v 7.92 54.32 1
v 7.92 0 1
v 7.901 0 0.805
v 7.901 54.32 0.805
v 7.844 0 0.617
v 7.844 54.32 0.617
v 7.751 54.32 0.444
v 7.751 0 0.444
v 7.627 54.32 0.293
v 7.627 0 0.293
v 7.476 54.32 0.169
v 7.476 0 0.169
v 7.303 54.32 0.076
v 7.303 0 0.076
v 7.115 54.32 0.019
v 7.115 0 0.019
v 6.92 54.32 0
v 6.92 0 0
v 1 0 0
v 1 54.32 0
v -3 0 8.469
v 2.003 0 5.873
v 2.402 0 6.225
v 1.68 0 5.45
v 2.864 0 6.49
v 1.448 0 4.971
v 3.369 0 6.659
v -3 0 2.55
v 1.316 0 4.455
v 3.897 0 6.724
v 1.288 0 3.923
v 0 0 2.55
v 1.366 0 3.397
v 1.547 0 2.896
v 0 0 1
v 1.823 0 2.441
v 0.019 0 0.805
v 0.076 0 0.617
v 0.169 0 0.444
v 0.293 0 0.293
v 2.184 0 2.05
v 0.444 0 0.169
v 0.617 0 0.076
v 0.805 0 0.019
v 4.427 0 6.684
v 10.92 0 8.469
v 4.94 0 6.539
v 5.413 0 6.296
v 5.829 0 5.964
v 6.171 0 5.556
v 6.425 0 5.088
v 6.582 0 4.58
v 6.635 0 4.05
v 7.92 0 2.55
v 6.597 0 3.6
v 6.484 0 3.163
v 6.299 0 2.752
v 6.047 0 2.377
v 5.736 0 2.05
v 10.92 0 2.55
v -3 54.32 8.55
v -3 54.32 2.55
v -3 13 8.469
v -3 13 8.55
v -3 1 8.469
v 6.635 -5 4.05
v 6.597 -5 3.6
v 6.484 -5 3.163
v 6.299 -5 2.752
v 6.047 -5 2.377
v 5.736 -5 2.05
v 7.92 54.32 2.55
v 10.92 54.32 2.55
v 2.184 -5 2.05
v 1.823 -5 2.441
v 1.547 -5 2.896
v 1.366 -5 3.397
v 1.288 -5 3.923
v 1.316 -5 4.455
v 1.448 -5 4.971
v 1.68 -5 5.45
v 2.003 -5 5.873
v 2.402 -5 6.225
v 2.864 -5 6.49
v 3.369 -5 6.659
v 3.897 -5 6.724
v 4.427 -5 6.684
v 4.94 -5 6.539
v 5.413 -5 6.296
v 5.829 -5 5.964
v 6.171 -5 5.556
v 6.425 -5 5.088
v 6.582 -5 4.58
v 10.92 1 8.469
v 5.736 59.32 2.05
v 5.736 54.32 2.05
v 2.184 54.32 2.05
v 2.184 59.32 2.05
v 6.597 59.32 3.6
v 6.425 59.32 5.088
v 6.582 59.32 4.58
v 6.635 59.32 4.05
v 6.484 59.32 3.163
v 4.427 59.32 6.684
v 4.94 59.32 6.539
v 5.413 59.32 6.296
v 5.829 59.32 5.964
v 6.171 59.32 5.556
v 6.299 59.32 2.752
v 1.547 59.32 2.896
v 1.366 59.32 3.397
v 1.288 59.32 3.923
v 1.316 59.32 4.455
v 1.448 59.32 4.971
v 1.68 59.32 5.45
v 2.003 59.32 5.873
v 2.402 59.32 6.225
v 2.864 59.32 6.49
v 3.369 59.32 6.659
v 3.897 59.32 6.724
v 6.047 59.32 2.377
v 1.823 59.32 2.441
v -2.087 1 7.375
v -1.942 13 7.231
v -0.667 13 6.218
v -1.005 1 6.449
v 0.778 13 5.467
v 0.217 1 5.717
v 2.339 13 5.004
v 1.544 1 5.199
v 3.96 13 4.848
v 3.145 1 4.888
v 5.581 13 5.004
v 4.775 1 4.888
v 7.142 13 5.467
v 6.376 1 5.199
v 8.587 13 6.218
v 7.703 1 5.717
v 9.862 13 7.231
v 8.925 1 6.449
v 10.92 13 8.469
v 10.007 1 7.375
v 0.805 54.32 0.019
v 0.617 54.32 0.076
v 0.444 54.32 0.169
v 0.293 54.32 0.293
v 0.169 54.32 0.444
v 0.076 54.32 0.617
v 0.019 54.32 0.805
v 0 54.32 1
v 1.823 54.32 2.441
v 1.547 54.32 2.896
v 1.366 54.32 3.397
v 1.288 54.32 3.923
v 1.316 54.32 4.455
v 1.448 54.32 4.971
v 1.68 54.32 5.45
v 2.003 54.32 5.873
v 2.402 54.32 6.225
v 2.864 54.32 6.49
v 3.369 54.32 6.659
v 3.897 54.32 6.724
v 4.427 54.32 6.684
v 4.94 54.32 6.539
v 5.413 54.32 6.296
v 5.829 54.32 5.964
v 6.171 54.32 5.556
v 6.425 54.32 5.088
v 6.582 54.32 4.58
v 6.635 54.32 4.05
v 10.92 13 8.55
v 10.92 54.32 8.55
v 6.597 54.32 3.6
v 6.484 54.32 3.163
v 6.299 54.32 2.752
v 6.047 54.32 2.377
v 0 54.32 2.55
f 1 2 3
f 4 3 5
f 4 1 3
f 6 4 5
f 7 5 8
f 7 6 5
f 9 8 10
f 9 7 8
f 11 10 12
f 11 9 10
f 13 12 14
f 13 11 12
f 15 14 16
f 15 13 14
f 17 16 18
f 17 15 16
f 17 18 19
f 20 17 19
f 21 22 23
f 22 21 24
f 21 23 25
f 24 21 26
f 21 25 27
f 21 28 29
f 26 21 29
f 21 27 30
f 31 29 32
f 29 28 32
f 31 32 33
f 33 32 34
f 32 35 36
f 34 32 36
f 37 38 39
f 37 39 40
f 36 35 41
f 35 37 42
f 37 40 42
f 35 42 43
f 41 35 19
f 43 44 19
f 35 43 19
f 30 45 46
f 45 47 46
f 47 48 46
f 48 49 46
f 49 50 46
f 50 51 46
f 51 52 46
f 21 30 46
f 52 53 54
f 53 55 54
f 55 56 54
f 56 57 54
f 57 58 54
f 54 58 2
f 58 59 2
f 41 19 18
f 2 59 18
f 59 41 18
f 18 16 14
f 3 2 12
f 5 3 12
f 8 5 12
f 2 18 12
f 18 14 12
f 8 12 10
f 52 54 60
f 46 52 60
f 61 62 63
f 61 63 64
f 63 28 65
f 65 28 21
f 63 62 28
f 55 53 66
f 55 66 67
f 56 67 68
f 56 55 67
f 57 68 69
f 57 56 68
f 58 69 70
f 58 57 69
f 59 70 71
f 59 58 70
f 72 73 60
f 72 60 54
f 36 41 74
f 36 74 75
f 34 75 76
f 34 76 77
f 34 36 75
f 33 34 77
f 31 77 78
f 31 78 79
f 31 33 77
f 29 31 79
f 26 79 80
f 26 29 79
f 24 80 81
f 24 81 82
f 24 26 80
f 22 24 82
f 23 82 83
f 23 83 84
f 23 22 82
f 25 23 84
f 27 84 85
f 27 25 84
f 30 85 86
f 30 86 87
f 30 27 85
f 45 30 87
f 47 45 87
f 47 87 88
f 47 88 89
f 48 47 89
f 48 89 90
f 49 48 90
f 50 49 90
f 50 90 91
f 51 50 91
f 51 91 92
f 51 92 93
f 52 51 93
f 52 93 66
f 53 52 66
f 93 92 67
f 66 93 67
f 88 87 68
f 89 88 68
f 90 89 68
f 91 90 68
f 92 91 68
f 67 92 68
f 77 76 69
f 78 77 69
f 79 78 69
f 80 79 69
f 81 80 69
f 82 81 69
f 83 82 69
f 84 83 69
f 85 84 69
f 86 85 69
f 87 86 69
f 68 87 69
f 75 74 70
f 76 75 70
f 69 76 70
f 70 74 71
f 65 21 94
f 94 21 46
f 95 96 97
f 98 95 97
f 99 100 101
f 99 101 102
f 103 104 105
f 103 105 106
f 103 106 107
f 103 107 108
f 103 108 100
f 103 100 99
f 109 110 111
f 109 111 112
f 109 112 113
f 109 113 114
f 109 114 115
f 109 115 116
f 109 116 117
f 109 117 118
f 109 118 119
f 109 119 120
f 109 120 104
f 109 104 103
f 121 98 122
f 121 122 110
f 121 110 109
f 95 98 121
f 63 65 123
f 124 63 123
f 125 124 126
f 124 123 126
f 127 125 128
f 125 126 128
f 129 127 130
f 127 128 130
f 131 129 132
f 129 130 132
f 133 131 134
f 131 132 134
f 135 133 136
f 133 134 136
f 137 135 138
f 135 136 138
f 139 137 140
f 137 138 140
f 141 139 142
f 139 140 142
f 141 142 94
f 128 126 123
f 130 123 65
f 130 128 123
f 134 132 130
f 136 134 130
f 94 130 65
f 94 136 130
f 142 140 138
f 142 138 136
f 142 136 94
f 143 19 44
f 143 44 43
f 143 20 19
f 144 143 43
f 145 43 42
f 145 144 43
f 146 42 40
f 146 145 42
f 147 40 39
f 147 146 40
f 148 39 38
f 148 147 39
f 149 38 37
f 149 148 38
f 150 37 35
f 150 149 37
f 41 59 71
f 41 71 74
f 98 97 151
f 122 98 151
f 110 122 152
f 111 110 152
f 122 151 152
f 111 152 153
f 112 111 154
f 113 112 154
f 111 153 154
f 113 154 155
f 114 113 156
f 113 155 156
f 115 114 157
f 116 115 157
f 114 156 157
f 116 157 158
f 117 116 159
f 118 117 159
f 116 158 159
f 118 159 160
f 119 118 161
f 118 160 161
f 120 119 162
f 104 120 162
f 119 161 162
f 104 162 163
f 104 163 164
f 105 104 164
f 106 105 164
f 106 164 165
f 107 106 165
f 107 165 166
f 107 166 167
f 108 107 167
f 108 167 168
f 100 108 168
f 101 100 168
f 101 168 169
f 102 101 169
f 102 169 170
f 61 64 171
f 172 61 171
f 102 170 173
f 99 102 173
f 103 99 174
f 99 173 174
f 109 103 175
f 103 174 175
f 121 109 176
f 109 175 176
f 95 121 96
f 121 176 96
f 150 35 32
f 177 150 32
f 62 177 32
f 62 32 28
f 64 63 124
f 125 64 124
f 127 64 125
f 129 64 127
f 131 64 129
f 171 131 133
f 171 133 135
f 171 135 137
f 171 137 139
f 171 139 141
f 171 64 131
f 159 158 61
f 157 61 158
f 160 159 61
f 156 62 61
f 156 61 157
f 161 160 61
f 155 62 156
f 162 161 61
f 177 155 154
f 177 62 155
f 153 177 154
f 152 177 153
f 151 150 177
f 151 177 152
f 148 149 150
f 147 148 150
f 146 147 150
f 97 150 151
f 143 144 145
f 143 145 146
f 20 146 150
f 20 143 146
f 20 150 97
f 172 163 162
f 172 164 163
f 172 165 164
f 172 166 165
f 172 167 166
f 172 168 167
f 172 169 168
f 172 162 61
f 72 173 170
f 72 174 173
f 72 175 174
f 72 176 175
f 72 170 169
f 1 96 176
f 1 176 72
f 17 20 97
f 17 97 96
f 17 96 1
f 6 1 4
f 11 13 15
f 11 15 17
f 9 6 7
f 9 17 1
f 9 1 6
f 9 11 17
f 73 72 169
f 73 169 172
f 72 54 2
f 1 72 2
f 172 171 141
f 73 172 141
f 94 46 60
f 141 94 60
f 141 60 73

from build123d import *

# Parameters (mm, degrees)
BOSS_EXTRUDE1_DEPTH = 54.32
FILLET1_R           = 1
BOSS_EXTRUDE2_DEPTH = 5
SKETCH3_R           = 8.5
CUT_EXTRUDE1_DEPTH  = 13
BOSS_EXTRUDE3_DEPTH = 1


with BuildPart() as part:
    # Sketch1 → Boss-Extrude1 (new body)
    with BuildSketch(Plane(origin=(0, 0, 0), x_dir=(1, 0, 0), z_dir=(0, 1, 0))):
        Polygon((10.92, -2.55), (7.92, -2.55), (7.92, 0), (0, 0), (0, -2.55), (-3, -2.55), (-3, -8.55), (10.92, -8.55), align=None)
    extrude(amount=BOSS_EXTRUDE1_DEPTH)

    # Fillet1
    fillet1_edges = [part.edges().sort_by_distance(p)[0] for p in [
        (0, 27.16, 0),
        (7.92, 27.16, 0),
    ]]
    fillet(fillet1_edges, radius=FILLET1_R)

    # Sketch2 → Boss-Extrude2 (add)
    with BuildSketch(Plane(origin=(0, 54.32, 0), x_dir=(1, 0, 0), z_dir=(0, 1, 0))):
        with BuildLine():
            Line((5.736407892, -2.05), (2.183592108, -2.05))
            ThreePointArc((2.183592108, -2.05), (2.863703077, -6.490032388), (6.635, -4.05))
            ThreePointArc((6.635, -4.05), (6.400032388, -2.953703077), (5.736407892, -2.05))
        make_face()
    boss_extrude2 = extrude(amount=BOSS_EXTRUDE2_DEPTH)

    # Mirror1: Boss-Extrude2 across plane
    add(boss_extrude2.mirror(Plane.ZX.offset(27.16)))

    # Sketch3 → Cut-Extrude1 (cut)
    with BuildSketch(Plane.XZ):
        with Locations((3.96, 13.348484692)):
            Circle(SKETCH3_R)
    extrude(amount=-CUT_EXTRUDE1_DEPTH, mode=Mode.SUBTRACT)

    # Sketch4 → Boss-Extrude3 (add)
    with BuildSketch(Plane(origin=(0, 0, 0), x_dir=(1, 0, 0), z_dir=(0, 1, 0))):
        with BuildLine():
            Line((-3, -8.469099485), (10.92, -8.469099485))
            ThreePointArc((10.92, -8.469099485), (8.9248008, -6.449154796), (6.375674383, -5.198974445))
            ThreePointArc((6.375674383, -5.198974445), (3.96, -4.848484692), (1.544325617, -5.198974445))
            ThreePointArc((1.544325617, -5.198974445), (-1.0048008, -6.449154796), (-3, -8.469099485))
        make_face()
    extrude(amount=BOSS_EXTRUDE3_DEPTH)


solid = part.part
